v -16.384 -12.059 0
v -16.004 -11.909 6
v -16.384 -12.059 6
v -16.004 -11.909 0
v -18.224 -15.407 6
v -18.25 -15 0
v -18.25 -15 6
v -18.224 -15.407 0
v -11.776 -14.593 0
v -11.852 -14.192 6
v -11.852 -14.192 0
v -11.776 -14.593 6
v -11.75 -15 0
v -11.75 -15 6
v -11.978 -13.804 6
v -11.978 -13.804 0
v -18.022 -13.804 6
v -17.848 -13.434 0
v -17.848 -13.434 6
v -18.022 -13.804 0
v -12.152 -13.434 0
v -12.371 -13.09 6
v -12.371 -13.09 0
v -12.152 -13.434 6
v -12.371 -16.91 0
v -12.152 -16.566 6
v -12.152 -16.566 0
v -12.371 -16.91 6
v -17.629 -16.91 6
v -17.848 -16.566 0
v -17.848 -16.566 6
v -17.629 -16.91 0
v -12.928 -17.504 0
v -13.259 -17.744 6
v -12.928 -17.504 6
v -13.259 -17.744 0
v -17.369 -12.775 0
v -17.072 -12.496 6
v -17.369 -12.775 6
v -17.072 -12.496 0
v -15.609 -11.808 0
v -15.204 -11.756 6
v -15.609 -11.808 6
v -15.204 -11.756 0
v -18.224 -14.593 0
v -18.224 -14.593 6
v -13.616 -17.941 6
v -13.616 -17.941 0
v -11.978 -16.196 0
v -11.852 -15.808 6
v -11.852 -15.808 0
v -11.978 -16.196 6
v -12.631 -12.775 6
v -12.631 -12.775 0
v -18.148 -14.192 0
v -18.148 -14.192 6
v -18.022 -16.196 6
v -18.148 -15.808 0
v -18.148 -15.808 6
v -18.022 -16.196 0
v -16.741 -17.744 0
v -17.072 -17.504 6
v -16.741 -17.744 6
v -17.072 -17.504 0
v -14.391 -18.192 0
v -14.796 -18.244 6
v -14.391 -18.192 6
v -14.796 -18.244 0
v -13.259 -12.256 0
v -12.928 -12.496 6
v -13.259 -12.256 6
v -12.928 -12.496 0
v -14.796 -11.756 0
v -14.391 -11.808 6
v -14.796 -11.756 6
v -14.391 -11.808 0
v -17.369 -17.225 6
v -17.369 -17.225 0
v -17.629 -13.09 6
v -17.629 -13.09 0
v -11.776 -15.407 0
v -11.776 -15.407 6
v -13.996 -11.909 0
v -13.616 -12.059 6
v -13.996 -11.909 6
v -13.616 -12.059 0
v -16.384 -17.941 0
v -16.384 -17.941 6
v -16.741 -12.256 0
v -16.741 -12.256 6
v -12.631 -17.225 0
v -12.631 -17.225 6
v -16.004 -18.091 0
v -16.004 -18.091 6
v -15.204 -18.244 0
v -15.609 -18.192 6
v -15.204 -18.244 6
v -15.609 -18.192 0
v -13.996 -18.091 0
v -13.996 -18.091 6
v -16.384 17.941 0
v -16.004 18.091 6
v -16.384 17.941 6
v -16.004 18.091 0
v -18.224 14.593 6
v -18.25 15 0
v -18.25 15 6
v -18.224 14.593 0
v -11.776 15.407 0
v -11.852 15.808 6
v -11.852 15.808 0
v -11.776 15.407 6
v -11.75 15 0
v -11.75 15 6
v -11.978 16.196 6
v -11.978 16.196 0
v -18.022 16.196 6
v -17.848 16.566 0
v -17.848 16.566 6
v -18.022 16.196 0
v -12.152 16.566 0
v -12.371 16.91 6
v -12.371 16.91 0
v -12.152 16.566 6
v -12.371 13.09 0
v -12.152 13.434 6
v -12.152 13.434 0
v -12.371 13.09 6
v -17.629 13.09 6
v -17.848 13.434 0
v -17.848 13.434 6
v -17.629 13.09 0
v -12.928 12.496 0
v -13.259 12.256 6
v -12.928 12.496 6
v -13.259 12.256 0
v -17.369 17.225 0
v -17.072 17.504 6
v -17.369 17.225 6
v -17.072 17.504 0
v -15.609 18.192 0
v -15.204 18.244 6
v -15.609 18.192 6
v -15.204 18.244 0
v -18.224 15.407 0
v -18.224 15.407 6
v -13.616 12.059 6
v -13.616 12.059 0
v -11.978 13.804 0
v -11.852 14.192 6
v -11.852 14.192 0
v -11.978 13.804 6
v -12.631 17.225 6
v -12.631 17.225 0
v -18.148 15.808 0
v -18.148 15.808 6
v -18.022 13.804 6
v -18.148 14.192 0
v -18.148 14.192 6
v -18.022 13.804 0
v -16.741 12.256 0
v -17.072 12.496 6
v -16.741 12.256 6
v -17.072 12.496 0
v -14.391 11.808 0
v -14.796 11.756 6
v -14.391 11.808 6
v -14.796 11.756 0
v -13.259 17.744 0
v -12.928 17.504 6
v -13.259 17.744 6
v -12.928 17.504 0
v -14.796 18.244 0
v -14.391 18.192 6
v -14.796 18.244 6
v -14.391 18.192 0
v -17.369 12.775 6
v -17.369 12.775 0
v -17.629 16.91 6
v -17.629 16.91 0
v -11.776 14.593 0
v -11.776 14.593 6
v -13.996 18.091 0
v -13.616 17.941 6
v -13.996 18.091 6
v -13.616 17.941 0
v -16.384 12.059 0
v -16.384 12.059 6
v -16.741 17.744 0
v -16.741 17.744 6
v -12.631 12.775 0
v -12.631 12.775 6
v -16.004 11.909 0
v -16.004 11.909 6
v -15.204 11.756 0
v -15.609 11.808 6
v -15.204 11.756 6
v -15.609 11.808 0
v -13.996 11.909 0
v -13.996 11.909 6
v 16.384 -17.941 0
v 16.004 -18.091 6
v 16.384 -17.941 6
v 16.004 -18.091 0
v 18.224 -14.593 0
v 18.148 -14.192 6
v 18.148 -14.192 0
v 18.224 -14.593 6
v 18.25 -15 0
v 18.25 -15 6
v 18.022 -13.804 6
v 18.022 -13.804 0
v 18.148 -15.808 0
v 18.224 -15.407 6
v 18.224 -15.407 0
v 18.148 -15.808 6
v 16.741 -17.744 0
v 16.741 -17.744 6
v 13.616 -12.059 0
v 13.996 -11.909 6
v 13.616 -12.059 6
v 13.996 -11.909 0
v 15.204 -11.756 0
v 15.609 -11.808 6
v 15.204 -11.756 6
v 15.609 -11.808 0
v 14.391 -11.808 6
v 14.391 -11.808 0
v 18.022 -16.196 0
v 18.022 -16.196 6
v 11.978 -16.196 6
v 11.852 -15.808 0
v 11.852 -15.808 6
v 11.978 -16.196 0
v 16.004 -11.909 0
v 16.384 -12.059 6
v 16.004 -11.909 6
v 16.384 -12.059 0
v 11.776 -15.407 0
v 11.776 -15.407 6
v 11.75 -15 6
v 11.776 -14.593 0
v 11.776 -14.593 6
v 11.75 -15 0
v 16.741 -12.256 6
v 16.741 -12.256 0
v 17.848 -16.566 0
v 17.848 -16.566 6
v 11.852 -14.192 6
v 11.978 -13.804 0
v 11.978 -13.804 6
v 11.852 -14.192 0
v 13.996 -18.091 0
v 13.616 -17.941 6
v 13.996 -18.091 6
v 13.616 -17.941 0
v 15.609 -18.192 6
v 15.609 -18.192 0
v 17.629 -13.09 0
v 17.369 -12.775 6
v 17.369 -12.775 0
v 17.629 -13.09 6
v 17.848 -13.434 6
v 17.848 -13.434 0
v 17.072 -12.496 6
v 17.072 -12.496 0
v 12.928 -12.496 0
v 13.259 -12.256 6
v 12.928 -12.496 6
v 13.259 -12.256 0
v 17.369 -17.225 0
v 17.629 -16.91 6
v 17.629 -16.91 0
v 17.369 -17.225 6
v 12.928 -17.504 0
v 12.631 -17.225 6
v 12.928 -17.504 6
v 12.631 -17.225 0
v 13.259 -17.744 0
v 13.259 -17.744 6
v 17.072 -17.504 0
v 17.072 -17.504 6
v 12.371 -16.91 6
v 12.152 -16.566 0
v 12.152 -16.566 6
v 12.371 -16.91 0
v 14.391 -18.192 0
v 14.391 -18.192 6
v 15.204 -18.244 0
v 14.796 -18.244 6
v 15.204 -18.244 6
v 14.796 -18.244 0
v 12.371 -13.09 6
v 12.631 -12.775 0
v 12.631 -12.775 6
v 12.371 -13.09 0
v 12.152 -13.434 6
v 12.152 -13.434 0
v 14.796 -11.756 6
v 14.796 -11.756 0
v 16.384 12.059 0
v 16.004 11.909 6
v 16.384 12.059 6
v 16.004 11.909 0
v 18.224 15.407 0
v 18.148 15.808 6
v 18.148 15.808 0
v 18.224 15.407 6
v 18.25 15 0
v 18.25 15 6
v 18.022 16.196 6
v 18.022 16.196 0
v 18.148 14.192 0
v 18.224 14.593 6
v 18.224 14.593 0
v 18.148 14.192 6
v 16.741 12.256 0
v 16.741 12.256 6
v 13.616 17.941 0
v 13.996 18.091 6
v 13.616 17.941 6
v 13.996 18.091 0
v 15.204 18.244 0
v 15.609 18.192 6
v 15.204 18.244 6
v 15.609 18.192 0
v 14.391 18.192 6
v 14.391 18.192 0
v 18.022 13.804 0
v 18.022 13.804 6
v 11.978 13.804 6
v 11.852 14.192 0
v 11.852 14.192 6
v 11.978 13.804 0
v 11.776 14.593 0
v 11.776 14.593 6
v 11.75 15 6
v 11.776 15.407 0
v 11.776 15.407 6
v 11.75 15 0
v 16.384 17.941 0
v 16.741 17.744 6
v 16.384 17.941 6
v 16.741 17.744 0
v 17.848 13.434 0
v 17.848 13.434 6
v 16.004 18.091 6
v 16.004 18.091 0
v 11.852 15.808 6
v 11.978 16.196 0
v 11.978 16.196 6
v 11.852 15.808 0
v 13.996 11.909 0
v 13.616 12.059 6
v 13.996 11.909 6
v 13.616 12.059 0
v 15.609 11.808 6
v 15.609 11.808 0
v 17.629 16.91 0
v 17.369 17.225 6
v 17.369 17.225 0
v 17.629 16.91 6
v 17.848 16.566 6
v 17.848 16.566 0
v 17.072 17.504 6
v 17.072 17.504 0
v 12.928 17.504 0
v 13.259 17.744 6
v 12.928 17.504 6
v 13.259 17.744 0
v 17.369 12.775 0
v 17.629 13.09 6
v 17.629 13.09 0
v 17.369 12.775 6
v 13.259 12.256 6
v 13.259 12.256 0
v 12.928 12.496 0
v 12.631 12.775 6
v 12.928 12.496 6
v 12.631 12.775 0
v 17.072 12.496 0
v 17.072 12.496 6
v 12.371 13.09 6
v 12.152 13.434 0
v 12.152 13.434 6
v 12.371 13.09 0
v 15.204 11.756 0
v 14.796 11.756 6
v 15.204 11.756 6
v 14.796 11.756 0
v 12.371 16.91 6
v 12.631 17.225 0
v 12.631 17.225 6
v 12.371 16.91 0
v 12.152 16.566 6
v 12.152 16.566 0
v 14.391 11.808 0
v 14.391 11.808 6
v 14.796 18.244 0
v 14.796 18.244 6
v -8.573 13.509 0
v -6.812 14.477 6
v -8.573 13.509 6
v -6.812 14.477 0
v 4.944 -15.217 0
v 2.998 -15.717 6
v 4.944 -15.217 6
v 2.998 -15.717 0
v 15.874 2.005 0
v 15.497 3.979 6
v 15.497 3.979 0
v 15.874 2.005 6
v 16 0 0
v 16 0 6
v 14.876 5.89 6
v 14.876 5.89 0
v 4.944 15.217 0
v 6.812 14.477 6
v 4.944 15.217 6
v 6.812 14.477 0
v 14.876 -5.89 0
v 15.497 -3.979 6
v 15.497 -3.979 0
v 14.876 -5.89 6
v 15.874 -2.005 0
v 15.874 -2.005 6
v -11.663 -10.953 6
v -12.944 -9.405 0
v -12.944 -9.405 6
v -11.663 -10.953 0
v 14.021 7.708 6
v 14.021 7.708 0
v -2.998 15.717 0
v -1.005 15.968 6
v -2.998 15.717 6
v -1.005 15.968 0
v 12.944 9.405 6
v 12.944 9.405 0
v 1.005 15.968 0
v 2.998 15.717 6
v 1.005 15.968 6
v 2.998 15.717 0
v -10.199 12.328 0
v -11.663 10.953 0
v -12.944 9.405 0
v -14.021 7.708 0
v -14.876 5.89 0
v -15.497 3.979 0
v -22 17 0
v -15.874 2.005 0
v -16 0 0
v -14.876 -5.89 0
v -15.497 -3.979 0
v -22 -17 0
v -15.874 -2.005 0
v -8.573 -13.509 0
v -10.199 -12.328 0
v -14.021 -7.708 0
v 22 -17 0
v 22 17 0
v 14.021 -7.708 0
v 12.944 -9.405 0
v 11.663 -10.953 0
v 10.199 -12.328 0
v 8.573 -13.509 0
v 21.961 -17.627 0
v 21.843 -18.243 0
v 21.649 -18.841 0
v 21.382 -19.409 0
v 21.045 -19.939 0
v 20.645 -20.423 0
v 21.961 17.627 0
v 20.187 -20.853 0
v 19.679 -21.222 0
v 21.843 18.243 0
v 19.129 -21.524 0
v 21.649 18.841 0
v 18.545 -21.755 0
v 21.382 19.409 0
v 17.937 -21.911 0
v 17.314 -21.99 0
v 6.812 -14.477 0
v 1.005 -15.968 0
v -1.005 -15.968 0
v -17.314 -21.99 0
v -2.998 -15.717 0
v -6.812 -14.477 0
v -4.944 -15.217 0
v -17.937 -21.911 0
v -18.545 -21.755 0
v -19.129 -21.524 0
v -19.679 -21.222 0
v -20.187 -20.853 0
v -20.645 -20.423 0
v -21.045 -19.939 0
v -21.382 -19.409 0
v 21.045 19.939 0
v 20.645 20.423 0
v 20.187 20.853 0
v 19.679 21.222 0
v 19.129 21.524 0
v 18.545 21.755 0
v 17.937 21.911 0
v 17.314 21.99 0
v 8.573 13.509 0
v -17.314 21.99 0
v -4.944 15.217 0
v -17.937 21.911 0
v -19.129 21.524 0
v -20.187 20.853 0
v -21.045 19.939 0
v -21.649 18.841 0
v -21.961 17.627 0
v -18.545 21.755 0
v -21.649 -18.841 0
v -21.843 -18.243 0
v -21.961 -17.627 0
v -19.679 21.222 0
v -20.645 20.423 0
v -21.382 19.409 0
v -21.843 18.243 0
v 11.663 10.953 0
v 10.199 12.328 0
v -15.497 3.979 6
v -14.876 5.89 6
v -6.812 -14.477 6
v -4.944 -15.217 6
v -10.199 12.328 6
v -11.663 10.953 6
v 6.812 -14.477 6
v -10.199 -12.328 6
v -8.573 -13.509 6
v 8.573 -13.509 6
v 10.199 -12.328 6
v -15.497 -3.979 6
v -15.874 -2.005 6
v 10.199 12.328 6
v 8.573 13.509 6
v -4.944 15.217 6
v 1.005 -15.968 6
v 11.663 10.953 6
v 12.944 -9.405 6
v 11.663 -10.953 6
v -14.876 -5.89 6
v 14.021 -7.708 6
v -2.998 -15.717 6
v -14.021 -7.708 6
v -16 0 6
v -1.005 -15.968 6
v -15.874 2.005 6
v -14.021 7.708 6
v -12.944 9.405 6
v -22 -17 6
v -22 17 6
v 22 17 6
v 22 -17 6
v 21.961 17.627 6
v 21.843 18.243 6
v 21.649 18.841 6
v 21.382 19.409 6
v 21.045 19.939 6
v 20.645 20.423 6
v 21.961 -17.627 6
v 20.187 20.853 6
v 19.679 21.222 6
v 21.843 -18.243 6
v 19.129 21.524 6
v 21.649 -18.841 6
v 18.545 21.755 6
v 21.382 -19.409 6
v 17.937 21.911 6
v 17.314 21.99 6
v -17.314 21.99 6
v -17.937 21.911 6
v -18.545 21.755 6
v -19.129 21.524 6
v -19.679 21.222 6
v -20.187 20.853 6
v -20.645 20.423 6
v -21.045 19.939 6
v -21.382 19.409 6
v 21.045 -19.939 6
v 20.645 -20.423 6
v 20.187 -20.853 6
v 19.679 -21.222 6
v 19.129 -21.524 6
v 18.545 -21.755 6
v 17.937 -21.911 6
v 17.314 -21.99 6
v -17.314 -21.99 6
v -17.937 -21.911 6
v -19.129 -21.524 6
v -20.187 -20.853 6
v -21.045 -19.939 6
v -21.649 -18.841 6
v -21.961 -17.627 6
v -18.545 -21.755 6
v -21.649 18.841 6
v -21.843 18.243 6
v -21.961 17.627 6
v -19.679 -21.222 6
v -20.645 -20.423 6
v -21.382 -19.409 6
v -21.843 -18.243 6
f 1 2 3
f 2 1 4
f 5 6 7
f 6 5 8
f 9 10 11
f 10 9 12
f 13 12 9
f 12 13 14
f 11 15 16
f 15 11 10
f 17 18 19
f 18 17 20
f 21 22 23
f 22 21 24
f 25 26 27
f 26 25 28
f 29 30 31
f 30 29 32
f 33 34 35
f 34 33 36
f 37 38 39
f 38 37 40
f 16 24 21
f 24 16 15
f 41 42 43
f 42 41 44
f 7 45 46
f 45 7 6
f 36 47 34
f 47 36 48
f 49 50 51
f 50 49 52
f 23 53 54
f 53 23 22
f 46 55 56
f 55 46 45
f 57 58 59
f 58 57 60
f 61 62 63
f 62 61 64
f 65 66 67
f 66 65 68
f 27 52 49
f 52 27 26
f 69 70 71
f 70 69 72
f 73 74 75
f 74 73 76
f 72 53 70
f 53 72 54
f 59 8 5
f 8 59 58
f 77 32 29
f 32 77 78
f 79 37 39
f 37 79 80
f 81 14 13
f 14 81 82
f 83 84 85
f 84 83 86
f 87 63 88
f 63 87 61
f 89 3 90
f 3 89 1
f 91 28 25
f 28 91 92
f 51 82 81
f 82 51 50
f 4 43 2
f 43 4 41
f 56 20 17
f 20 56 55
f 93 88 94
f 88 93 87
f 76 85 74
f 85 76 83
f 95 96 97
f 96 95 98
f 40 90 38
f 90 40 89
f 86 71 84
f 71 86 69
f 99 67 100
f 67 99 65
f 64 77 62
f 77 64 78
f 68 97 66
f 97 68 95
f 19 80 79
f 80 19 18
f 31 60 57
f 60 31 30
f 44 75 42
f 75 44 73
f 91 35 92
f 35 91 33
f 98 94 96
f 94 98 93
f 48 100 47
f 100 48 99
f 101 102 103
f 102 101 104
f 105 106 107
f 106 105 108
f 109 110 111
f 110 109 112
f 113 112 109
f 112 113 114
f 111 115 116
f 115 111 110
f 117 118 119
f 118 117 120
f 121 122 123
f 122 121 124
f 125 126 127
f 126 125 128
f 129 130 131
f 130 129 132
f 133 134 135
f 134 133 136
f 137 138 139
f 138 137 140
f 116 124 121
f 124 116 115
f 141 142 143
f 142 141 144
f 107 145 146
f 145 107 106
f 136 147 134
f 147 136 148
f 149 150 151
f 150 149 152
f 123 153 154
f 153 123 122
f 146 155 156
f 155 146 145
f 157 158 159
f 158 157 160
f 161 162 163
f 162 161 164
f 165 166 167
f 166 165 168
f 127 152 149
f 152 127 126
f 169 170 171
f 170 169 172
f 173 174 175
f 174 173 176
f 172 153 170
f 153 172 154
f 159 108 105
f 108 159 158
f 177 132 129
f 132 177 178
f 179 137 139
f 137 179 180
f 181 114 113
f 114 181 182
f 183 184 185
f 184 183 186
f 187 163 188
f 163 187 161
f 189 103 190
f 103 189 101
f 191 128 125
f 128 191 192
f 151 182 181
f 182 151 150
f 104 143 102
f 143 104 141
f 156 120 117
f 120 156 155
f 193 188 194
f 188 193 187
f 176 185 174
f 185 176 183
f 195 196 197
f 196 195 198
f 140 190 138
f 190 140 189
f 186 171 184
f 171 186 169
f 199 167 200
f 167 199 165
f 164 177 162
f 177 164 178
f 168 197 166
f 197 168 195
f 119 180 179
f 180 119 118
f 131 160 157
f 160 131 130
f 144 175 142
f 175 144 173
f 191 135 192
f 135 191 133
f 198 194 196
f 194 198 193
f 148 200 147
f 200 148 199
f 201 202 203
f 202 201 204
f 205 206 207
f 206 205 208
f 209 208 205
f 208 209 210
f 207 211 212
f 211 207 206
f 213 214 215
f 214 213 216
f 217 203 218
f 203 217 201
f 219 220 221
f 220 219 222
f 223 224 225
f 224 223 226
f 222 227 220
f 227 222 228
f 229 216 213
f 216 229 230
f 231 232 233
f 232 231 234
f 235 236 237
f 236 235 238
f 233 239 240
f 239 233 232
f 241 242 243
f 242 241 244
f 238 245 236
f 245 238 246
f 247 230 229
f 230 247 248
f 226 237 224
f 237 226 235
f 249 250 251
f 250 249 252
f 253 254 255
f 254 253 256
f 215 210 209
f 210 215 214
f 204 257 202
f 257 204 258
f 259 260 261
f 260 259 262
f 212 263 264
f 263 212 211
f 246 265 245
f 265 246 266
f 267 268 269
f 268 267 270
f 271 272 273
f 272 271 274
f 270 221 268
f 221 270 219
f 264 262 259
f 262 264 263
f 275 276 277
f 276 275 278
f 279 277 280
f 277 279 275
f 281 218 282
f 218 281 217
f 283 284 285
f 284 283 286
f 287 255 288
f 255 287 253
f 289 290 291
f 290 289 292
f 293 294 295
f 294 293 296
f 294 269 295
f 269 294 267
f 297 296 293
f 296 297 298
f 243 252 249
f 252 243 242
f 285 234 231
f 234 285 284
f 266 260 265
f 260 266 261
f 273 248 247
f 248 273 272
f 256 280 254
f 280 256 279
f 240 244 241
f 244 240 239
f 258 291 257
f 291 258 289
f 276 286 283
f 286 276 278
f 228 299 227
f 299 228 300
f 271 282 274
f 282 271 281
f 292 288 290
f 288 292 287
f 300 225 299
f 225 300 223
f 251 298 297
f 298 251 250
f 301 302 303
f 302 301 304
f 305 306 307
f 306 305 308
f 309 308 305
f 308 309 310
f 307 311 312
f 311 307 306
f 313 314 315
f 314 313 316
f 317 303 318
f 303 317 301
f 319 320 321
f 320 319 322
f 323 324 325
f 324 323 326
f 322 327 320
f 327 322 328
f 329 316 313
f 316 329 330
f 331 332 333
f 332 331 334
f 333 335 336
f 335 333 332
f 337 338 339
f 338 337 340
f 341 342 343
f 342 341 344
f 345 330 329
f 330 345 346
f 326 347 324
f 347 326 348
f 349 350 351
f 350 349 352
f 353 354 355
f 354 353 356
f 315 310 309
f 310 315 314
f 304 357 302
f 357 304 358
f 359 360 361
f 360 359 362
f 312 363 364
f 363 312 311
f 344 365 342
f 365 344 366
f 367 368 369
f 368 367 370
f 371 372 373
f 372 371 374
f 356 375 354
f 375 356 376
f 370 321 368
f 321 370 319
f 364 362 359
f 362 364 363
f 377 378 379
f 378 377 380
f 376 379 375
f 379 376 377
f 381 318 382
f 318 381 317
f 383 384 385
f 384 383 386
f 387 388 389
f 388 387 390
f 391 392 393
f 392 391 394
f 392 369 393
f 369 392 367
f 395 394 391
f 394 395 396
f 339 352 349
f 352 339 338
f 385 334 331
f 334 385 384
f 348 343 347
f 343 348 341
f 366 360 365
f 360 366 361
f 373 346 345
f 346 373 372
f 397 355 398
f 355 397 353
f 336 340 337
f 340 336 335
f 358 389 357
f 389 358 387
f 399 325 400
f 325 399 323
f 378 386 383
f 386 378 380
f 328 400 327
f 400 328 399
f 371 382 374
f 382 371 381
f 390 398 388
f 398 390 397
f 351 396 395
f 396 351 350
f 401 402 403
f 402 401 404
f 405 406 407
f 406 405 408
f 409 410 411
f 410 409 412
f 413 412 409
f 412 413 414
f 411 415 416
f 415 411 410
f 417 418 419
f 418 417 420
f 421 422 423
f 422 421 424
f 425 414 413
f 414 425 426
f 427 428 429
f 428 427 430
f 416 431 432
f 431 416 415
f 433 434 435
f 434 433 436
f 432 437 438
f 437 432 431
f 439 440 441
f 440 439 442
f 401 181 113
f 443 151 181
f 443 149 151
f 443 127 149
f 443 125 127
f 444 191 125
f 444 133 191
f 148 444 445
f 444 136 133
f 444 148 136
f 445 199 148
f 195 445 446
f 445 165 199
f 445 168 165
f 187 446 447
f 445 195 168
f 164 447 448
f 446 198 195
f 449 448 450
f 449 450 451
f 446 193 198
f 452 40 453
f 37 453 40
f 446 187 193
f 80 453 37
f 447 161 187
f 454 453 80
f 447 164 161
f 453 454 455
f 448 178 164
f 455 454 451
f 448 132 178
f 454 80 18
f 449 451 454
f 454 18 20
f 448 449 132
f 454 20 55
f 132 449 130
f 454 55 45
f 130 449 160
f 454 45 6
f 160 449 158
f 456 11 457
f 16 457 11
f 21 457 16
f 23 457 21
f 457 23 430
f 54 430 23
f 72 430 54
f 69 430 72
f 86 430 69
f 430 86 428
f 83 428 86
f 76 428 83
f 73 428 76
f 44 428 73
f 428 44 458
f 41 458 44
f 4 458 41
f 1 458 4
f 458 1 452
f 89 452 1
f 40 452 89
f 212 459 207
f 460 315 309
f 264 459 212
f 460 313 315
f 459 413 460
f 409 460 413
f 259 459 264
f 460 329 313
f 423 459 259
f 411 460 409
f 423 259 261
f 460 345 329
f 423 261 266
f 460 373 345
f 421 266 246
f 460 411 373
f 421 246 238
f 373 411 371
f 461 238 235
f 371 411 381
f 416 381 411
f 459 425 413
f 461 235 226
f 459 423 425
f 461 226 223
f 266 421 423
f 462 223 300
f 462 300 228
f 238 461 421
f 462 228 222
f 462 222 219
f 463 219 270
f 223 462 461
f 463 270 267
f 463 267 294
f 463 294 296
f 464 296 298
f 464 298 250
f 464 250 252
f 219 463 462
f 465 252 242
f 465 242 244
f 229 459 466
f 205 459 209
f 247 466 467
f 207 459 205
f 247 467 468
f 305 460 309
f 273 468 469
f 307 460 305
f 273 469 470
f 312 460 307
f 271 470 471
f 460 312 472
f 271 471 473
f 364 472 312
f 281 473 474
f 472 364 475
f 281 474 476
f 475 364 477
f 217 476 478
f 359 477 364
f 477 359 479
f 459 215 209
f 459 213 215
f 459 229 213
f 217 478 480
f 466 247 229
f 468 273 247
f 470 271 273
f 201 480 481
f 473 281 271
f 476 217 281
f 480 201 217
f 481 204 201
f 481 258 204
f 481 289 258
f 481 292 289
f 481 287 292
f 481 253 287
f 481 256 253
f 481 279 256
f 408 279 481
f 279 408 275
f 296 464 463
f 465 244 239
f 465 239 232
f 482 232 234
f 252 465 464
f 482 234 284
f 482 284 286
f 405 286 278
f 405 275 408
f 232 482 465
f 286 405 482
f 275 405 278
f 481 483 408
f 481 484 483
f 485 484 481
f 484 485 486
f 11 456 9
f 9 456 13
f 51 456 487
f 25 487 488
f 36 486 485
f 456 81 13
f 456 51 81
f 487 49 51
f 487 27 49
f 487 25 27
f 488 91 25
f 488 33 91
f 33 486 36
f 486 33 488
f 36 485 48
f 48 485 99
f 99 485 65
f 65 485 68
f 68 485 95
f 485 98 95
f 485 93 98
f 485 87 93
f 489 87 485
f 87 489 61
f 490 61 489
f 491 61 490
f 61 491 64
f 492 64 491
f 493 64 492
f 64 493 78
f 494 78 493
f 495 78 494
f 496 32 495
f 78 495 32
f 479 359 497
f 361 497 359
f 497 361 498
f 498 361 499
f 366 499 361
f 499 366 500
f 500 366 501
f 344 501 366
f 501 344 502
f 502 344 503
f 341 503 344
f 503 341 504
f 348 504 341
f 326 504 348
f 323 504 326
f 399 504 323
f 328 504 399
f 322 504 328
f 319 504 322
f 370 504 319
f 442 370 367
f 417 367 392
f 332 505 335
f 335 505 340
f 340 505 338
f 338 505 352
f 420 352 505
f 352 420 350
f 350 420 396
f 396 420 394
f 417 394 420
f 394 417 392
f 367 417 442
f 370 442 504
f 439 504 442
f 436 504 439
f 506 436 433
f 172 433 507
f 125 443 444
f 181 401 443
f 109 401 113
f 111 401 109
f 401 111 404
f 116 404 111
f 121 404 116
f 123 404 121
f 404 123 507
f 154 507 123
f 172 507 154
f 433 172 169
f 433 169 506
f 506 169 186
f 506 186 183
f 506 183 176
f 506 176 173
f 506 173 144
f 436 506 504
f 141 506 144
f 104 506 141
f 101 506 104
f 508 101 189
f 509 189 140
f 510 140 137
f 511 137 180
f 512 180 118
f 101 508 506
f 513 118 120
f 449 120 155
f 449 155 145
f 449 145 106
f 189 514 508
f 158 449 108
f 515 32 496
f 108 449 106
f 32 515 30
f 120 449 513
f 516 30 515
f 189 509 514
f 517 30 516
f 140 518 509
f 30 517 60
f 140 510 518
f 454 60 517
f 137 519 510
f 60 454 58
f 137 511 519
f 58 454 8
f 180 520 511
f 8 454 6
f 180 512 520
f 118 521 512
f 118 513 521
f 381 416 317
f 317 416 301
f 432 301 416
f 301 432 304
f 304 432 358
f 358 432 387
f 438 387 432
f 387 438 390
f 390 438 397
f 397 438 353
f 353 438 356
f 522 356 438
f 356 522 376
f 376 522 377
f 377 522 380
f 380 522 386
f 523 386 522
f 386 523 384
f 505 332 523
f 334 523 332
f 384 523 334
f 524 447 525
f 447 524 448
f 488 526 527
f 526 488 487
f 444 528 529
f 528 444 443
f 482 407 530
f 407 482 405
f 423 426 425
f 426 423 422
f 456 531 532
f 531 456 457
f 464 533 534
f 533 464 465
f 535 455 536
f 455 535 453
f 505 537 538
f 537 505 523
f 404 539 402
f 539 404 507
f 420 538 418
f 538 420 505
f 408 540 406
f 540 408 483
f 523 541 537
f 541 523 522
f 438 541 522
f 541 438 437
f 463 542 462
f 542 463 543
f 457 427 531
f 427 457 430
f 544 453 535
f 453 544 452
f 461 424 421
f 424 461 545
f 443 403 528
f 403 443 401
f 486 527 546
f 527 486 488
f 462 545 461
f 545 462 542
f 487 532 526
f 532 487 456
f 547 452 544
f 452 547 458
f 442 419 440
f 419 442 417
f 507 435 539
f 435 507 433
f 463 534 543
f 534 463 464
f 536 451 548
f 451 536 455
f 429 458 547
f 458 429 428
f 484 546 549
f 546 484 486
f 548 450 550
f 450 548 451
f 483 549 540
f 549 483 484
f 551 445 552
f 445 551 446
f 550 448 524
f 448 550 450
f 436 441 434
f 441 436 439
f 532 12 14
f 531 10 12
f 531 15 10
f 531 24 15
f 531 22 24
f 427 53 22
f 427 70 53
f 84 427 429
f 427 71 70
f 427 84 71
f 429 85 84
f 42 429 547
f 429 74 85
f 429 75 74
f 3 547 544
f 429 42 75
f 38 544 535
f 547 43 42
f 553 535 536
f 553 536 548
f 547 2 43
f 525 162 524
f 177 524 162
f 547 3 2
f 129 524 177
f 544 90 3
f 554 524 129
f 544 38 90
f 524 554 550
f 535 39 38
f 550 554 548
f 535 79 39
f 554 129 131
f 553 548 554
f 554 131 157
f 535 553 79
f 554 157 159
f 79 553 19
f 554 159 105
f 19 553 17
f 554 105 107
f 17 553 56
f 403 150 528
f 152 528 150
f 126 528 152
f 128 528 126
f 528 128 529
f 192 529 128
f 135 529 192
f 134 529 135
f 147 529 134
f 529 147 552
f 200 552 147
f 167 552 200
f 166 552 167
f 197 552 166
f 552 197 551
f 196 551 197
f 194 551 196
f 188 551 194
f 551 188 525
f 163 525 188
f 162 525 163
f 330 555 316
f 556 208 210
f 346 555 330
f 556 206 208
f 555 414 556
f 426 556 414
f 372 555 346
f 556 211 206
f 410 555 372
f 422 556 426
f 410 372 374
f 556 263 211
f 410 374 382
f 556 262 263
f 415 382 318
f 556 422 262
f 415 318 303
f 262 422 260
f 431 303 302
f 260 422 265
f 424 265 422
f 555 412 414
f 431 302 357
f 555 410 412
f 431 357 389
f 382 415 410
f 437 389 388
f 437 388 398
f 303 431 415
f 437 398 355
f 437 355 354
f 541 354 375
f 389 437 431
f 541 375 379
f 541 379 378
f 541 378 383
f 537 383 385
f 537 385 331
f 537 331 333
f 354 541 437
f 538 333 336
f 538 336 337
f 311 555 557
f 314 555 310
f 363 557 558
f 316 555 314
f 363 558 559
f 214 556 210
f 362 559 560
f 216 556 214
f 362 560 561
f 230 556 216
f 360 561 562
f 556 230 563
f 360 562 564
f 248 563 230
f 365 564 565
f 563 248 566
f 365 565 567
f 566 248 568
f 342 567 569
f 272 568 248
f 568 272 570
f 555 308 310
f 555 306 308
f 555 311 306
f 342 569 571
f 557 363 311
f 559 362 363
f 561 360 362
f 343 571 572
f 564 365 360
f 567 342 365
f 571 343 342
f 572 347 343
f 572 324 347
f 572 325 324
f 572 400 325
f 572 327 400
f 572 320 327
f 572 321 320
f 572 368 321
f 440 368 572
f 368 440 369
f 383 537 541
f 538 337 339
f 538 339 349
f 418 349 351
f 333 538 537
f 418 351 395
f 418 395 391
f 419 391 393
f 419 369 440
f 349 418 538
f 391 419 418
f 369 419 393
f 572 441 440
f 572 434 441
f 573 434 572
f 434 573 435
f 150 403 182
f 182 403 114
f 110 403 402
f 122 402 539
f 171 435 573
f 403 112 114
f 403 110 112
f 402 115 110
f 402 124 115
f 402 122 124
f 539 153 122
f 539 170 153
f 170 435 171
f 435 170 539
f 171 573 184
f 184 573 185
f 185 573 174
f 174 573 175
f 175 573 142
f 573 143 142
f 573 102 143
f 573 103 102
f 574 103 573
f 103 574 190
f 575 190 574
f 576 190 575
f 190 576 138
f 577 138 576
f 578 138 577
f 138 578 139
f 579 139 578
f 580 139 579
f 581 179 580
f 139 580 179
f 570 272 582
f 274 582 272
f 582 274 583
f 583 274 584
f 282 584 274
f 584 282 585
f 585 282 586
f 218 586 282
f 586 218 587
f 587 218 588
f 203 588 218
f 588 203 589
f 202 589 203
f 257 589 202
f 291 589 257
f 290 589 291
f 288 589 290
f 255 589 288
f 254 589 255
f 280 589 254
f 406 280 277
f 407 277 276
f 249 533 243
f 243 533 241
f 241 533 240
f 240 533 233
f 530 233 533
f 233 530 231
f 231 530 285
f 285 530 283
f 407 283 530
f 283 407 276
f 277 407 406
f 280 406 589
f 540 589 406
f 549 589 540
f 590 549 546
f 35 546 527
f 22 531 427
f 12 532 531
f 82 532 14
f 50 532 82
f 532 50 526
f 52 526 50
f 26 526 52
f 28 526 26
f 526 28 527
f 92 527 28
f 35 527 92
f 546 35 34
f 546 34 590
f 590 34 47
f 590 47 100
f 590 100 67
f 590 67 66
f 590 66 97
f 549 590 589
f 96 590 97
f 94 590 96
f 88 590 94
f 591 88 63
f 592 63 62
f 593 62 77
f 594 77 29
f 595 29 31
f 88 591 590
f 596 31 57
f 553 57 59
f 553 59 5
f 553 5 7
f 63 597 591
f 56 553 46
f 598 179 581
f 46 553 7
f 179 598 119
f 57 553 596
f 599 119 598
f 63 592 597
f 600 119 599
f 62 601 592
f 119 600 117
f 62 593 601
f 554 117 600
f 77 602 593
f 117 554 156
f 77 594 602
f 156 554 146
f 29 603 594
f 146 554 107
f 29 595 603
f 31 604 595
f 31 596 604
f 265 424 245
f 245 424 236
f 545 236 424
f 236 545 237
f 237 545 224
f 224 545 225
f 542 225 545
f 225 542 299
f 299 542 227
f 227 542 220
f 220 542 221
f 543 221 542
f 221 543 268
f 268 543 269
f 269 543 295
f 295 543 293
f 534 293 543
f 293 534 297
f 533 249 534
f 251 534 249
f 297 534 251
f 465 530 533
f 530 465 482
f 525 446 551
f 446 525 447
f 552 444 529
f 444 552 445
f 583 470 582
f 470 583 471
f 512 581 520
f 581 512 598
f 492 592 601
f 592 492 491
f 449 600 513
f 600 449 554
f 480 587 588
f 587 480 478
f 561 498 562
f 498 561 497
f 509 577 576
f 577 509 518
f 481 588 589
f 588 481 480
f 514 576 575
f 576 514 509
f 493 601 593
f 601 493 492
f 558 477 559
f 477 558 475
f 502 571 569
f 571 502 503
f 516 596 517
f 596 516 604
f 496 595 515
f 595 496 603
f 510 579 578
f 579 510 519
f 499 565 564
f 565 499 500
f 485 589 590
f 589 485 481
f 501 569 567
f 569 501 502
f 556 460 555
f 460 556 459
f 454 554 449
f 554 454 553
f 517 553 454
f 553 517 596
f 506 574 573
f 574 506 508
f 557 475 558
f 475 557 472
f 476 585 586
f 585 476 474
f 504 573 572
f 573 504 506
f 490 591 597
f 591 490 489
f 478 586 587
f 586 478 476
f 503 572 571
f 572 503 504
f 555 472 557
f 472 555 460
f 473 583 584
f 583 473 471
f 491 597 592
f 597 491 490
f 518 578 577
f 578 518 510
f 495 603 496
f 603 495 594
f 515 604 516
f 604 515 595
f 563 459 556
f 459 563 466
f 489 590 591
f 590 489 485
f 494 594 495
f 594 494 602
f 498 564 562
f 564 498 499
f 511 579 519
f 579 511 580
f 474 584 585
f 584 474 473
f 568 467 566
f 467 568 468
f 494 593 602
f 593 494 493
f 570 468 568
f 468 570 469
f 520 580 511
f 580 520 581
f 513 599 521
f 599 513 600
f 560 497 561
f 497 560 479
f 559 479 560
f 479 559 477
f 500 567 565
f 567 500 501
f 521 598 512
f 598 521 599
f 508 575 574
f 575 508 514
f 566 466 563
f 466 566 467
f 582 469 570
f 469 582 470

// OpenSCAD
$fn = 50;

difference() {
	union() {
		hull() {
			translate(v = [-17.0, 17.0, 0]) {
				cylinder(h = 6, r = 5);
			}
			translate(v = [17.0, 17.0, 0]) {
				cylinder(h = 6, r = 5);
			}
			translate(v = [-17.0, -17.0, 0]) {
				cylinder(h = 6, r = 5);
			}
			translate(v = [17.0, -17.0, 0]) {
				cylinder(h = 6, r = 5);
			}
		}
	}
	union() {
		translate(v = [-15.0, -15.0, -100.0]) {
			cylinder(h = 200, r = 3.25);
		}
		translate(v = [-15.0, 15.0, -100.0]) {
			cylinder(h = 200, r = 3.25);
		}
		translate(v = [15.0, -15.0, -100.0]) {
			cylinder(h = 200, r = 3.25);
		}
		translate(v = [15.0, 15.0, -100.0]) {
			cylinder(h = 200, r = 3.25);
		}
		translate(v = [-15.0, -15.0, -100.0]) {
			cylinder(h = 200, r = 1.8);
		}
		translate(v = [-15.0, 15.0, -100.0]) {
			cylinder(h = 200, r = 1.8);
		}
		translate(v = [15.0, -15.0, -100.0]) {
			cylinder(h = 200, r = 1.8);
		}
		translate(v = [15.0, 15.0, -100.0]) {
			cylinder(h = 200, r = 1.8);
		}
		cylinder(h = 6, r = 16.0);
	}
}
